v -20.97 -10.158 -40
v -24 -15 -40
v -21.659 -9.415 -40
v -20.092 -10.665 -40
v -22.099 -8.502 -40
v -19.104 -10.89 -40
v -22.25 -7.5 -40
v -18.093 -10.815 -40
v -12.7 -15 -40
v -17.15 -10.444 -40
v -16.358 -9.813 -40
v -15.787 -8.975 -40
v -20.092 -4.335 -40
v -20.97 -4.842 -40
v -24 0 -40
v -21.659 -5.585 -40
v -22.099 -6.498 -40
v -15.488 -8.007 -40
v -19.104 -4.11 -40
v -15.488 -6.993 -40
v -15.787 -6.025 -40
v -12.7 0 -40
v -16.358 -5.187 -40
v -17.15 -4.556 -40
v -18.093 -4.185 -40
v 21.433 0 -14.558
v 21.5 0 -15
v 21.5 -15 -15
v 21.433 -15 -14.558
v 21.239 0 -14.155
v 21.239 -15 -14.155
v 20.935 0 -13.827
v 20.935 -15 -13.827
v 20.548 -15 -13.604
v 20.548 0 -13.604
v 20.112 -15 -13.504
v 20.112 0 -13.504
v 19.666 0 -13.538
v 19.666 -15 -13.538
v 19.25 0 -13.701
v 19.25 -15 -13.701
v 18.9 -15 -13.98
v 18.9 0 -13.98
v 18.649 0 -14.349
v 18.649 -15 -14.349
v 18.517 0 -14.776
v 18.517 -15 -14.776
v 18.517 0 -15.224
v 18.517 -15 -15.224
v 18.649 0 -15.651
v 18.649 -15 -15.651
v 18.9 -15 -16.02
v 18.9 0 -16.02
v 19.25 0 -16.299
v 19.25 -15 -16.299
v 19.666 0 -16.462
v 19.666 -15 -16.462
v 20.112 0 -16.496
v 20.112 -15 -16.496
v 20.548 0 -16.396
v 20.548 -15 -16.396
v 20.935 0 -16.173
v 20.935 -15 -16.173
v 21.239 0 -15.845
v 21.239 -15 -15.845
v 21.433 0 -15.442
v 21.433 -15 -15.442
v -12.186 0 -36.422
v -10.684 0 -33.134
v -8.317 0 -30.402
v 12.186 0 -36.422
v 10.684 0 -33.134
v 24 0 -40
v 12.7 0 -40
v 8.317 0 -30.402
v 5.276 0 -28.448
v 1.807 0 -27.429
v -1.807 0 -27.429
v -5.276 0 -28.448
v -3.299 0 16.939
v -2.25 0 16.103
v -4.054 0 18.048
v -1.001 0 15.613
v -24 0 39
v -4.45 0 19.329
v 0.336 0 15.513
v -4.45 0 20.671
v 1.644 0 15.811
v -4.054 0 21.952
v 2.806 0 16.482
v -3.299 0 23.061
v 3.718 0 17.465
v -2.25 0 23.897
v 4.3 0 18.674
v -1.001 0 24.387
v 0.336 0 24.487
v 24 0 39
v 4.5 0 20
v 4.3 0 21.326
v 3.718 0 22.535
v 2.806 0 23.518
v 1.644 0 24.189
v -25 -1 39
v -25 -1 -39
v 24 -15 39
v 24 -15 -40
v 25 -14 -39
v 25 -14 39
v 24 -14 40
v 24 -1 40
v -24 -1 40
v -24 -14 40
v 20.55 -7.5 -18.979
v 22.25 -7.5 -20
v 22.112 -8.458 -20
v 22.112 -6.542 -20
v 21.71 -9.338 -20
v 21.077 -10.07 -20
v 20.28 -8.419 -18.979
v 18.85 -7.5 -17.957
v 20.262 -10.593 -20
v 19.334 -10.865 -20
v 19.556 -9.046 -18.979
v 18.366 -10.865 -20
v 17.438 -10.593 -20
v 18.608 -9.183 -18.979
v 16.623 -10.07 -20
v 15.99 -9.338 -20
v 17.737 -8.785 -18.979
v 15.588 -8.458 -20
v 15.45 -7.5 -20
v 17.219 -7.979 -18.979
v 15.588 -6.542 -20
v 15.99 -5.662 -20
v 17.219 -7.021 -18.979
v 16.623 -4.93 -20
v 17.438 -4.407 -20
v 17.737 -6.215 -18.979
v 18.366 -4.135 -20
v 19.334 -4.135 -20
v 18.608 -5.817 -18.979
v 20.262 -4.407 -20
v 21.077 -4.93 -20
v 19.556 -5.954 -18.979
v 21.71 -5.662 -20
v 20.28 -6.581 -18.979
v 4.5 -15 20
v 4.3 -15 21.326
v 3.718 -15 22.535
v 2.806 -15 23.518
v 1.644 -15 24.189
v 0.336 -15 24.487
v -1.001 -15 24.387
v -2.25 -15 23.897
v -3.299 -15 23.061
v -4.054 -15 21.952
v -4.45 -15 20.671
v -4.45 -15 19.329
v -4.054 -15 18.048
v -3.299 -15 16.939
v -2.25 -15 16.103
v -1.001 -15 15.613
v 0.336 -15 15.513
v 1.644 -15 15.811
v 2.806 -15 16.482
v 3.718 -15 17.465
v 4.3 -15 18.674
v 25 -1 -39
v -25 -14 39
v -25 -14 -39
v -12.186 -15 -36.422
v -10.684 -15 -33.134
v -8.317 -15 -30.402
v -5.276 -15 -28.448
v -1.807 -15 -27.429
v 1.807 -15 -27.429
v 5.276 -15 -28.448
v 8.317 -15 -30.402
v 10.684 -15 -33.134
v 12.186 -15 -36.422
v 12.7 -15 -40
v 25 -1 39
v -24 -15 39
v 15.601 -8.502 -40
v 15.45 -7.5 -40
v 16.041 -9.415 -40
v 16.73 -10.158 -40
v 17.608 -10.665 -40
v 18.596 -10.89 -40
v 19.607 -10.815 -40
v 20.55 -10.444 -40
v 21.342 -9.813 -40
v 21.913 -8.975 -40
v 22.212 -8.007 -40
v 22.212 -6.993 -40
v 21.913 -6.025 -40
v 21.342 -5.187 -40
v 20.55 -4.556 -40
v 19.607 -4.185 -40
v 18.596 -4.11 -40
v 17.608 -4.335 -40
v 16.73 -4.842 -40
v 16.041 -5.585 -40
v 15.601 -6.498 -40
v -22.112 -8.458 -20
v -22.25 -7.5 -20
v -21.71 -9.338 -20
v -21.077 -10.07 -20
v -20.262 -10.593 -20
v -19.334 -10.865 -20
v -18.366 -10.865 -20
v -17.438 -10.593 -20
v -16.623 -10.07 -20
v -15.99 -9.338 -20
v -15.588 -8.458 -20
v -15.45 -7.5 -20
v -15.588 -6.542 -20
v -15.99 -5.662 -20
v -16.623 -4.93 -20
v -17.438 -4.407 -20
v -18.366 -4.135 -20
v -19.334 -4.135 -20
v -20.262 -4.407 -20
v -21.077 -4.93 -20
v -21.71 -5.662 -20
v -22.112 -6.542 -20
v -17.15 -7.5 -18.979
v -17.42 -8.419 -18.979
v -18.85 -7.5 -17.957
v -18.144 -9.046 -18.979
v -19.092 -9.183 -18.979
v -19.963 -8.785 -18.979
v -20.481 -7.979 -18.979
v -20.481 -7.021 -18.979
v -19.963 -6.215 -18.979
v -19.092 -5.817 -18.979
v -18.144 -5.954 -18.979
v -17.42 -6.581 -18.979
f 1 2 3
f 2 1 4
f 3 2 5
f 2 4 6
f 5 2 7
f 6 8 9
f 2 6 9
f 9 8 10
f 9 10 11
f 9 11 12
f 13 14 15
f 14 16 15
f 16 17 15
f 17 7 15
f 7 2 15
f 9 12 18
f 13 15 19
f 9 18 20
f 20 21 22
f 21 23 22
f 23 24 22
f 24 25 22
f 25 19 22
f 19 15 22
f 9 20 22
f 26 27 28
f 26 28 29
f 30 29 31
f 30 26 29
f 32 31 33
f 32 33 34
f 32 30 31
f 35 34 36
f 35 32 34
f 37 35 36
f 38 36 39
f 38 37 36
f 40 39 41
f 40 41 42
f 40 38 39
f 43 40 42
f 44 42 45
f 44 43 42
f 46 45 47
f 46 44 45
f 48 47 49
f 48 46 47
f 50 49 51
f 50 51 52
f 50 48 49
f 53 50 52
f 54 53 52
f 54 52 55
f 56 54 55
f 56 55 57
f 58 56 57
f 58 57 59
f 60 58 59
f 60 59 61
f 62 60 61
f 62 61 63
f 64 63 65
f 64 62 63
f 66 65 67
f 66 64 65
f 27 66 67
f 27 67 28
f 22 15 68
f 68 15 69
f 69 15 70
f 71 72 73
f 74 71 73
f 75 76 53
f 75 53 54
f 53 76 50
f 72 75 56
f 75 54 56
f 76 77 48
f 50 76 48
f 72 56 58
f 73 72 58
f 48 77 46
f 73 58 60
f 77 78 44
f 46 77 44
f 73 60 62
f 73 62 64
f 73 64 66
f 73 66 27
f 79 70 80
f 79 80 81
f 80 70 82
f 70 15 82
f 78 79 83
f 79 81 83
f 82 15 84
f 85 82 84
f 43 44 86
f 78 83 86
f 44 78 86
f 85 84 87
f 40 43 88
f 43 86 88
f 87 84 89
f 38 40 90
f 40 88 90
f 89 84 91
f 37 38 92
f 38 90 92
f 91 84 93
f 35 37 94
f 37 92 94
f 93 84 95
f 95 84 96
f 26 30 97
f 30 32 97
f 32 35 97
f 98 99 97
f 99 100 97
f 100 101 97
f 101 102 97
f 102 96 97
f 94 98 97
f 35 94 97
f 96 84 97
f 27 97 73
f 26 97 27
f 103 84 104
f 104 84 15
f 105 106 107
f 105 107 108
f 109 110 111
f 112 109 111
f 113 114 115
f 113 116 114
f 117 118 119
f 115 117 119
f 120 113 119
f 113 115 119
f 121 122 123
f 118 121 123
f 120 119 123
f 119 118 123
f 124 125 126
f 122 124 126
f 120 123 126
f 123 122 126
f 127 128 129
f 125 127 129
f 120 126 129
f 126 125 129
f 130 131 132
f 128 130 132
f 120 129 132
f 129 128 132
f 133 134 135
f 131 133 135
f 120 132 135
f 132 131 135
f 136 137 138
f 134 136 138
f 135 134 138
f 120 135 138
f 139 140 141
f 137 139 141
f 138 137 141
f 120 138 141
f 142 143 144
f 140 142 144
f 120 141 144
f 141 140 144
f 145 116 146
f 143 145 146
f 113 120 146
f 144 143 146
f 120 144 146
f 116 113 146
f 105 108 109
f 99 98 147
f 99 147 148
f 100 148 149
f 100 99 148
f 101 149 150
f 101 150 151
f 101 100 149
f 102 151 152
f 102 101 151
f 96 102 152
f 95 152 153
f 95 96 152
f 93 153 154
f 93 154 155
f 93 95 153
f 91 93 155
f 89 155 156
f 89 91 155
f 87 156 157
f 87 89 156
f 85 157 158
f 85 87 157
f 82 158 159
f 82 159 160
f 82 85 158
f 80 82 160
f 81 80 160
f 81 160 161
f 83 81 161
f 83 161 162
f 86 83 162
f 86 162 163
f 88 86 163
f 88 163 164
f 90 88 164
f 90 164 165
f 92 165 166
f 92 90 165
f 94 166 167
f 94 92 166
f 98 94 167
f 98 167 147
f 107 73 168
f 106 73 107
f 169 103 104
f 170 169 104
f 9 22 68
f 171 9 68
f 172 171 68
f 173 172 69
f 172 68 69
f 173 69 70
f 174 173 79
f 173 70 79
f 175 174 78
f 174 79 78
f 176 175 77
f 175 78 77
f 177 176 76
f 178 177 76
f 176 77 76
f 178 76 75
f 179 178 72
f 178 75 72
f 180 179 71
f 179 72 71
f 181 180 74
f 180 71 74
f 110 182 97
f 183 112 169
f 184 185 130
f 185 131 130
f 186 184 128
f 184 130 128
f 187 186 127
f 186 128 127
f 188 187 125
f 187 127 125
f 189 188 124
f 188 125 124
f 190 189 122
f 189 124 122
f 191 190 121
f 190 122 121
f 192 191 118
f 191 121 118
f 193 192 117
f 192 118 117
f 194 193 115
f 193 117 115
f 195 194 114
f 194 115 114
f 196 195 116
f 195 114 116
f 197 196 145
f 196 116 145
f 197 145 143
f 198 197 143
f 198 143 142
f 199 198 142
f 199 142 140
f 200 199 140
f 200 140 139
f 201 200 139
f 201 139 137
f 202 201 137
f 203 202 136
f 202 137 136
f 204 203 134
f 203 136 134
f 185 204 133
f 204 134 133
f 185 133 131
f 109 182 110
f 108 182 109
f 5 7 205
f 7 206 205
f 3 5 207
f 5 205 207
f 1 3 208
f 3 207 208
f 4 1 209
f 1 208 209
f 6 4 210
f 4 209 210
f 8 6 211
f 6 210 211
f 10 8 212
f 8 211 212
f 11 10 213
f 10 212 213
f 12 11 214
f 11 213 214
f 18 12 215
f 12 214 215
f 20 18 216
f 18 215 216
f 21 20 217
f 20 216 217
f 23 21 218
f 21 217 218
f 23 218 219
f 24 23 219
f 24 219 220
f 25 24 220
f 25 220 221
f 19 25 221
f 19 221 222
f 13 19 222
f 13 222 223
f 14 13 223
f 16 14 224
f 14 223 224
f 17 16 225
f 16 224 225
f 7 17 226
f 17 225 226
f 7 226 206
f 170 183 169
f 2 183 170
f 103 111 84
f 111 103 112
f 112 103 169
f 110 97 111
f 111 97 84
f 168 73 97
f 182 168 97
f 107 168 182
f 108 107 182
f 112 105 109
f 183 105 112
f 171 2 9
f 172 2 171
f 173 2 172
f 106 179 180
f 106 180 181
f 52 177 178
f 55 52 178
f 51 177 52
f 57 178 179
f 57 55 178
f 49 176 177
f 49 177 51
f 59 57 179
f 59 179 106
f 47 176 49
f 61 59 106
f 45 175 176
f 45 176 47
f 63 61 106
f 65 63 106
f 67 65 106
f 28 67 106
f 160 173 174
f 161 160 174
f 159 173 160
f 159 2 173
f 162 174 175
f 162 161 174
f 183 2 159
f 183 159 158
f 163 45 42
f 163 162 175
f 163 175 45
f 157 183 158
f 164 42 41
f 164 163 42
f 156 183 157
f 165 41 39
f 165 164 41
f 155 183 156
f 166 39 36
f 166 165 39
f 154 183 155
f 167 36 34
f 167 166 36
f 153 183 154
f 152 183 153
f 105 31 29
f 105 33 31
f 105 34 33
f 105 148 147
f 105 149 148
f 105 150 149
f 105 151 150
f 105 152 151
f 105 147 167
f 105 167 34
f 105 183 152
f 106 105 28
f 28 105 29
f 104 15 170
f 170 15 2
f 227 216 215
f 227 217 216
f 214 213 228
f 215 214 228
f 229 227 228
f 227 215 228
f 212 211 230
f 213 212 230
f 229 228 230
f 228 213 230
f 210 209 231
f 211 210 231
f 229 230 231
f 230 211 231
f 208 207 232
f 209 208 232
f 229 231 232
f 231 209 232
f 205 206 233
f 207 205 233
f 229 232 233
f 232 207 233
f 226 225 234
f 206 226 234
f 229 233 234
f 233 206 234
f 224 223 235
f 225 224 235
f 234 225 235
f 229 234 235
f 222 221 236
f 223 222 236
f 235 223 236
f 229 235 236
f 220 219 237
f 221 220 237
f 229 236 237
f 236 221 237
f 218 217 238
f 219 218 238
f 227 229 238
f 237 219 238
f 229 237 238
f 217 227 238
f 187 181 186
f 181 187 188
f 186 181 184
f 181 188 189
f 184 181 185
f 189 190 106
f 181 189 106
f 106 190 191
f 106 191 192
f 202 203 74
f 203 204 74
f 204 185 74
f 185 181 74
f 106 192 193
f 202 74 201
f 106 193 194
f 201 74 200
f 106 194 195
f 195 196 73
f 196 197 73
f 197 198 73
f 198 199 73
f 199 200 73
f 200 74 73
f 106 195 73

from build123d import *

# Parameters (mm, degrees)
F0_R     = 1.5
F0_R_2   = 4.5
F1_DEPTH = 15
F3_D     = 6.8
F3_DEPTH = 20
F3_TIP   = 2.0429261047
F5_D     = 6.8
F5_DEPTH = 20
F5_TIP   = 2.0429261047
F6_SIZE  = 1


with BuildPart() as f1:
    # F0 (on Front) → F1 (new body)
    with BuildSketch(Plane.XZ):
        with BuildLine():
            Line((25, 40), (-25, 40))
            Line((-25, 40), (-25, -40))
            Line((-25, -40), (-12.7, -40))
            ThreePointArc((-12.7, -40), (0, -27.3), (12.7, -40))
            Line((12.7, -40), (25, -40))
            Line((25, -40), (25, 40))
        make_face()
        with Locations((20, -15)):
            Circle(F0_R, mode=Mode.SUBTRACT)
        with Locations((0, 20)):
            Circle(F0_R_2, mode=Mode.SUBTRACT)
    extrude(amount=F1_DEPTH)

    # F3
    with Locations(Plane(origin=(0, 0, -40), x_dir=(1, 0, 0), z_dir=(0, 0, -1))):
        with Locations((-18.85, 7.5)):
            Hole(F3_D / 2, depth=F3_DEPTH)
            with Locations((0, 0, -(F3_DEPTH + F3_TIP / 2))):  # 118° drill point
                Cone(0, F3_D / 2, F3_TIP, mode=Mode.SUBTRACT)

    # F5
    with Locations(Plane(origin=(0, 0, -40), x_dir=(1, 0, 0), z_dir=(0, 0, -1))):
        with Locations((18.85, 7.5)):
            Hole(F5_D / 2, depth=F5_DEPTH)
            with Locations((0, 0, -(F5_DEPTH + F5_TIP / 2))):  # 118° drill point
                Cone(0, F5_D / 2, F5_TIP, mode=Mode.SUBTRACT)

    # F6
    f6_edges = [f1.edges().sort_by_distance(p)[0] for p in [
        (25, -7.5, -40),
        (25, -7.5, 40),
        (25, 0, 0),
        (25, -15, 0),
        (-25, -7.5, 40),
        (0, 0, 40),
        (0, -15, 40),
        (-25, -7.5, -40),
        (-25, 0, 0),
        (-25, -15, 0),
    ]]
    chamfer(f6_edges, length=F6_SIZE)


solid = f1.part
